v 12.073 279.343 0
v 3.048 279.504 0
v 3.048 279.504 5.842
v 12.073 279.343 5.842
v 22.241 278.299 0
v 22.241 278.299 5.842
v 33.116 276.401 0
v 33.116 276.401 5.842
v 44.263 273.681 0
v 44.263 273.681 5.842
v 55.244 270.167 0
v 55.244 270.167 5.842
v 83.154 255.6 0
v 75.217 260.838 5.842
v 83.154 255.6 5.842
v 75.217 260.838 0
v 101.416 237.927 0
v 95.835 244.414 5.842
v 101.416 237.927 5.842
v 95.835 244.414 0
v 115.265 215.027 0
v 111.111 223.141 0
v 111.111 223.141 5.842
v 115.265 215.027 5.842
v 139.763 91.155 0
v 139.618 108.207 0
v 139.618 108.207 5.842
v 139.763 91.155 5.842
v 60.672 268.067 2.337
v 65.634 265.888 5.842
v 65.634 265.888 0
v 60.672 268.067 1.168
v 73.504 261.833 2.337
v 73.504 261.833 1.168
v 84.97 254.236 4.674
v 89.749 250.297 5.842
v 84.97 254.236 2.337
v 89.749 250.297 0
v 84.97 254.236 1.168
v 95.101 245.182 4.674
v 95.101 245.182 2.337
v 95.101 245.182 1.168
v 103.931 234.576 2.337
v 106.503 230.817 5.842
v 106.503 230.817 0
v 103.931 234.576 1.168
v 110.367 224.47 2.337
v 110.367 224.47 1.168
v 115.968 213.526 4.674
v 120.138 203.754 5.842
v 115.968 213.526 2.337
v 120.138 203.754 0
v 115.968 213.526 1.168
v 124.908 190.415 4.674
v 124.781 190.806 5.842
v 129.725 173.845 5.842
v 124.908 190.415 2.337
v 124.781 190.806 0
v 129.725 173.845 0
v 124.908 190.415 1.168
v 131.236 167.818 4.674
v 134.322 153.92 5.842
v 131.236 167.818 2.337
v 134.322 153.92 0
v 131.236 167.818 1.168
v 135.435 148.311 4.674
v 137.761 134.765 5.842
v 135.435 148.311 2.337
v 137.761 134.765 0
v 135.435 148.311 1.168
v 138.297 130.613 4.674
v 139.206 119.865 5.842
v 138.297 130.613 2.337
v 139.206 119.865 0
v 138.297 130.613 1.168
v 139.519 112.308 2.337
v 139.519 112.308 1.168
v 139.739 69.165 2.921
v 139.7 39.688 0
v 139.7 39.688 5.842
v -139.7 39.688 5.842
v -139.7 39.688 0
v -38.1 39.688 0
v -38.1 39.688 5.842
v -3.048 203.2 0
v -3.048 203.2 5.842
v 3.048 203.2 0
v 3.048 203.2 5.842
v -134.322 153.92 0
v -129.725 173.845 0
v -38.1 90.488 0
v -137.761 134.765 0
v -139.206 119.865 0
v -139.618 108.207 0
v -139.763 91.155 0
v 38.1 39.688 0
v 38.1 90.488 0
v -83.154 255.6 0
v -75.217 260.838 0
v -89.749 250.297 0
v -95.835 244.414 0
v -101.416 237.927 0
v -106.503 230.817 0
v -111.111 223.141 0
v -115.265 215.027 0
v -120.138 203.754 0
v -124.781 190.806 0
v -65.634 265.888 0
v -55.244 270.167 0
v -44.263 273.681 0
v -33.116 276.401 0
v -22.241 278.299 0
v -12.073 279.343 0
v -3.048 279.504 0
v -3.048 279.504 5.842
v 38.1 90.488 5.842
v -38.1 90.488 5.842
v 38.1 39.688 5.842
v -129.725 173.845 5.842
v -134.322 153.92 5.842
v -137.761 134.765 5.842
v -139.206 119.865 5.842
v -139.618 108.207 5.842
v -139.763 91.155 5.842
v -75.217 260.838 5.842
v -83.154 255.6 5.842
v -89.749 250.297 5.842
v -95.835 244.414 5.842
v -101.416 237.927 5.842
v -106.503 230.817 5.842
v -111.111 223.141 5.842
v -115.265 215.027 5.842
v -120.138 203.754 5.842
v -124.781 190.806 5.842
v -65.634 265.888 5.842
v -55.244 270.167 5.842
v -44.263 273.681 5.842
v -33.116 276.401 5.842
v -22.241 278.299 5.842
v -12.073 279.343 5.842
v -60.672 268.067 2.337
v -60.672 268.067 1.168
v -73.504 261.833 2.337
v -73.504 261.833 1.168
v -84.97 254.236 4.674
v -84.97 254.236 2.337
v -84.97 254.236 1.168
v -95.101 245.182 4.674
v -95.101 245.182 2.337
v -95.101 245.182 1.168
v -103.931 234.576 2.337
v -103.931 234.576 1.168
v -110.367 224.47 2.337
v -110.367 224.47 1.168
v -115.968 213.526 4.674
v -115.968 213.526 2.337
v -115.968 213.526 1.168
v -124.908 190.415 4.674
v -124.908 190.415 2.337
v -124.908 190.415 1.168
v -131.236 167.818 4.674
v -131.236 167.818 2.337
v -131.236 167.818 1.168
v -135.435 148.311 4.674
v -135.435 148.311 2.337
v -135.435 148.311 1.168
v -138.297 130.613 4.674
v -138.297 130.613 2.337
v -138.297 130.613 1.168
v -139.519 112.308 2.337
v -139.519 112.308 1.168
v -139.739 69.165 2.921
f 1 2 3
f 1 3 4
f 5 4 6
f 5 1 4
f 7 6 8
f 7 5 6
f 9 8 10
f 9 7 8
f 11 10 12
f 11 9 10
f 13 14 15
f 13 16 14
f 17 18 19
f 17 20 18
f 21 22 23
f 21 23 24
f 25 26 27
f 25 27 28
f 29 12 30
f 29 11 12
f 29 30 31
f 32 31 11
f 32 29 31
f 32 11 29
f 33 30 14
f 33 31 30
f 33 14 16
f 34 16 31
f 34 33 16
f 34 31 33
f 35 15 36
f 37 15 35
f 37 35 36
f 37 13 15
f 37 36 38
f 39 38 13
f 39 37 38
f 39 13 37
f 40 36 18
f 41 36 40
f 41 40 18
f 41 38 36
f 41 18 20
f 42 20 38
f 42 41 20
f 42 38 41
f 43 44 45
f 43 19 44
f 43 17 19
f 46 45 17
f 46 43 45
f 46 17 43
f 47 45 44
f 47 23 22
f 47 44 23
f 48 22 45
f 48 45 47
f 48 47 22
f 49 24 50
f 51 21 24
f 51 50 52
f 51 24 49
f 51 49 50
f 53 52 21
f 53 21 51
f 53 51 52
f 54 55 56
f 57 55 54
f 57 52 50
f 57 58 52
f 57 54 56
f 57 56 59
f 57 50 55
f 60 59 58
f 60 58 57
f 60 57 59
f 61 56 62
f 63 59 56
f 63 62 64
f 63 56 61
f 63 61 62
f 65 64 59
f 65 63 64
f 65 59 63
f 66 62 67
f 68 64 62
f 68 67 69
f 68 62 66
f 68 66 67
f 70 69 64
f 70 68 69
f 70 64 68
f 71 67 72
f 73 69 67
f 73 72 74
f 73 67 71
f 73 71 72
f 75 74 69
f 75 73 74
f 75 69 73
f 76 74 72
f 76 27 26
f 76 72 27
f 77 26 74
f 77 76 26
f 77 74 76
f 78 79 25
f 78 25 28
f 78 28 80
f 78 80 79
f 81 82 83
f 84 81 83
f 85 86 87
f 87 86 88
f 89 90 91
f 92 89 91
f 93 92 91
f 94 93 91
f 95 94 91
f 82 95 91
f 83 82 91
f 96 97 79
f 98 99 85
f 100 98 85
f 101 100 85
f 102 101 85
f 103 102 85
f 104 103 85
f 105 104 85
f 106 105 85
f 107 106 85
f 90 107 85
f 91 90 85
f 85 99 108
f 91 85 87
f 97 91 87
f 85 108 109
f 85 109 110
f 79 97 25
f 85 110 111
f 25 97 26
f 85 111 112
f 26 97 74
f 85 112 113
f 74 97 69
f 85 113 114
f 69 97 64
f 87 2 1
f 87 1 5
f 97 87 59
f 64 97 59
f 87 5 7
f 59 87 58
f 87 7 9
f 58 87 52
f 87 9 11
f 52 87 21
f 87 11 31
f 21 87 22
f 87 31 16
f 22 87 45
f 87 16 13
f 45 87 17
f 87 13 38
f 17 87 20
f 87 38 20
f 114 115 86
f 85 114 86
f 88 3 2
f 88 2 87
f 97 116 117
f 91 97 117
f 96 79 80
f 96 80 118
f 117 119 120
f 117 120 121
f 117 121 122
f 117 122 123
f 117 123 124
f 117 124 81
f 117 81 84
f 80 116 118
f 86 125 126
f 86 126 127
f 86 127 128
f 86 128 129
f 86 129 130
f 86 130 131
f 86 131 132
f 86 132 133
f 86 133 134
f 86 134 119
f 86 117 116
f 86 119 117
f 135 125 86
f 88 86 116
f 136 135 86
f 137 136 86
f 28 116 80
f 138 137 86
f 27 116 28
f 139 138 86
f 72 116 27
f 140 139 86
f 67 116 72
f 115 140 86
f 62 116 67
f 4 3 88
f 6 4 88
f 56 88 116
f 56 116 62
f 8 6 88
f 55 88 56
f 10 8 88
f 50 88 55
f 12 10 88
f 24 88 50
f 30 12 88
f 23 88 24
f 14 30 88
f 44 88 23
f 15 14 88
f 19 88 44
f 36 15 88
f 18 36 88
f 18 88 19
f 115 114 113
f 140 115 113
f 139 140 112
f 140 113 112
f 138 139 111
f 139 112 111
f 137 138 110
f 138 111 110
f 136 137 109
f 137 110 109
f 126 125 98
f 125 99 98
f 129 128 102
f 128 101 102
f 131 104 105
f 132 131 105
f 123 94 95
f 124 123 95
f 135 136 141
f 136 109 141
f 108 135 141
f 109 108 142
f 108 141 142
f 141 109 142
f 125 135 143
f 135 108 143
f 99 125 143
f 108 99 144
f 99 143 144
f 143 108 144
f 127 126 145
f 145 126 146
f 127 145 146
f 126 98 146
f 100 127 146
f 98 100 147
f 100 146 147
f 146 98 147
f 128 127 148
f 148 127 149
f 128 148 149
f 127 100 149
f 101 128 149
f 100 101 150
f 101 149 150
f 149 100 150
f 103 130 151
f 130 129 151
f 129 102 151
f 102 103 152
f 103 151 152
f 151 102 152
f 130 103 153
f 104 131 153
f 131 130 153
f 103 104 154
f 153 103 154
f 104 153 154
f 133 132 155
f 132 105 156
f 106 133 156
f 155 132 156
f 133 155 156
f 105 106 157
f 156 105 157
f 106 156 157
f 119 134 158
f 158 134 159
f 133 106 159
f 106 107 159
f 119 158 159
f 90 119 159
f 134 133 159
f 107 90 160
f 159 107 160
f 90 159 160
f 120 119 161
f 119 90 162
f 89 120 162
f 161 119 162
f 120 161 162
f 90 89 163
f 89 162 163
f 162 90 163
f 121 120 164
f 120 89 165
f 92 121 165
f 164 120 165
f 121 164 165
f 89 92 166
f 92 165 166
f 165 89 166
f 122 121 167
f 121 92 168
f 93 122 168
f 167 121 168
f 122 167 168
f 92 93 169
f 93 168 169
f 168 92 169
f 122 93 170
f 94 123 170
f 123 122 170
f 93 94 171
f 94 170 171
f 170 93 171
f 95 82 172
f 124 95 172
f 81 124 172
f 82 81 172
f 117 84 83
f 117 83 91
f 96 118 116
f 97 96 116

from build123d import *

# Parameters (mm, degrees)
BOSS_EXTRUDE1_DEPTH = 5.842
SKETCH3_W           = 38.1
SKETCH3_H           = 50.8
CUT_EXTRUDE1_DEPTH  = 313.597261712


with BuildPart() as part:
    # Sketch2 → Boss-Extrude1 (new body)
    with BuildSketch(Plane.XY):
        with BuildLine():
            Line((139.7, 39.6875), (0, 39.6875))
            Line((0, 39.6875), (0, 279.4))
            add(Edge.make_bspline(
                [(0, 279.4), (0.899505202, 279.4), (16.492381926, 280.353025588), (63.371494318, 272.22775417), (117.029317673, 231.616459975), (141.431993663, 126.233406498), (139.7, 115.50324322), (139.7, 39.6875)],
                knots=[0, 0, 0, 0, 0.009736034, 0.194720679, 0.367314873, 0.657046702, 1, 1, 1, 1], degree=3))
        make_face()
    extrude(amount=BOSS_EXTRUDE1_DEPTH)

    # Sketch3 → Cut-Extrude1 (cut, through all)
    with BuildSketch(Plane.XY.offset(5.842)):
        Polygon((0, 279.4), (0, 282.23249209), (3.048, 282.23249209), (3.048, 203.2), (0, 203.2), align=None)
        with Locations((19.05, 65.0875)):
            Rectangle(SKETCH3_W, SKETCH3_H)
    extrude(amount=-CUT_EXTRUDE1_DEPTH, mode=Mode.SUBTRACT)

    # Mirror1: part across plane


with BuildPart() as part_1:
    add(part.part)
    add(part.part.mirror(Plane(origin=(0, 0, 0), x_dir=(0, 0, 1), z_dir=(1, 0, 0))))


solid = part_1.part
